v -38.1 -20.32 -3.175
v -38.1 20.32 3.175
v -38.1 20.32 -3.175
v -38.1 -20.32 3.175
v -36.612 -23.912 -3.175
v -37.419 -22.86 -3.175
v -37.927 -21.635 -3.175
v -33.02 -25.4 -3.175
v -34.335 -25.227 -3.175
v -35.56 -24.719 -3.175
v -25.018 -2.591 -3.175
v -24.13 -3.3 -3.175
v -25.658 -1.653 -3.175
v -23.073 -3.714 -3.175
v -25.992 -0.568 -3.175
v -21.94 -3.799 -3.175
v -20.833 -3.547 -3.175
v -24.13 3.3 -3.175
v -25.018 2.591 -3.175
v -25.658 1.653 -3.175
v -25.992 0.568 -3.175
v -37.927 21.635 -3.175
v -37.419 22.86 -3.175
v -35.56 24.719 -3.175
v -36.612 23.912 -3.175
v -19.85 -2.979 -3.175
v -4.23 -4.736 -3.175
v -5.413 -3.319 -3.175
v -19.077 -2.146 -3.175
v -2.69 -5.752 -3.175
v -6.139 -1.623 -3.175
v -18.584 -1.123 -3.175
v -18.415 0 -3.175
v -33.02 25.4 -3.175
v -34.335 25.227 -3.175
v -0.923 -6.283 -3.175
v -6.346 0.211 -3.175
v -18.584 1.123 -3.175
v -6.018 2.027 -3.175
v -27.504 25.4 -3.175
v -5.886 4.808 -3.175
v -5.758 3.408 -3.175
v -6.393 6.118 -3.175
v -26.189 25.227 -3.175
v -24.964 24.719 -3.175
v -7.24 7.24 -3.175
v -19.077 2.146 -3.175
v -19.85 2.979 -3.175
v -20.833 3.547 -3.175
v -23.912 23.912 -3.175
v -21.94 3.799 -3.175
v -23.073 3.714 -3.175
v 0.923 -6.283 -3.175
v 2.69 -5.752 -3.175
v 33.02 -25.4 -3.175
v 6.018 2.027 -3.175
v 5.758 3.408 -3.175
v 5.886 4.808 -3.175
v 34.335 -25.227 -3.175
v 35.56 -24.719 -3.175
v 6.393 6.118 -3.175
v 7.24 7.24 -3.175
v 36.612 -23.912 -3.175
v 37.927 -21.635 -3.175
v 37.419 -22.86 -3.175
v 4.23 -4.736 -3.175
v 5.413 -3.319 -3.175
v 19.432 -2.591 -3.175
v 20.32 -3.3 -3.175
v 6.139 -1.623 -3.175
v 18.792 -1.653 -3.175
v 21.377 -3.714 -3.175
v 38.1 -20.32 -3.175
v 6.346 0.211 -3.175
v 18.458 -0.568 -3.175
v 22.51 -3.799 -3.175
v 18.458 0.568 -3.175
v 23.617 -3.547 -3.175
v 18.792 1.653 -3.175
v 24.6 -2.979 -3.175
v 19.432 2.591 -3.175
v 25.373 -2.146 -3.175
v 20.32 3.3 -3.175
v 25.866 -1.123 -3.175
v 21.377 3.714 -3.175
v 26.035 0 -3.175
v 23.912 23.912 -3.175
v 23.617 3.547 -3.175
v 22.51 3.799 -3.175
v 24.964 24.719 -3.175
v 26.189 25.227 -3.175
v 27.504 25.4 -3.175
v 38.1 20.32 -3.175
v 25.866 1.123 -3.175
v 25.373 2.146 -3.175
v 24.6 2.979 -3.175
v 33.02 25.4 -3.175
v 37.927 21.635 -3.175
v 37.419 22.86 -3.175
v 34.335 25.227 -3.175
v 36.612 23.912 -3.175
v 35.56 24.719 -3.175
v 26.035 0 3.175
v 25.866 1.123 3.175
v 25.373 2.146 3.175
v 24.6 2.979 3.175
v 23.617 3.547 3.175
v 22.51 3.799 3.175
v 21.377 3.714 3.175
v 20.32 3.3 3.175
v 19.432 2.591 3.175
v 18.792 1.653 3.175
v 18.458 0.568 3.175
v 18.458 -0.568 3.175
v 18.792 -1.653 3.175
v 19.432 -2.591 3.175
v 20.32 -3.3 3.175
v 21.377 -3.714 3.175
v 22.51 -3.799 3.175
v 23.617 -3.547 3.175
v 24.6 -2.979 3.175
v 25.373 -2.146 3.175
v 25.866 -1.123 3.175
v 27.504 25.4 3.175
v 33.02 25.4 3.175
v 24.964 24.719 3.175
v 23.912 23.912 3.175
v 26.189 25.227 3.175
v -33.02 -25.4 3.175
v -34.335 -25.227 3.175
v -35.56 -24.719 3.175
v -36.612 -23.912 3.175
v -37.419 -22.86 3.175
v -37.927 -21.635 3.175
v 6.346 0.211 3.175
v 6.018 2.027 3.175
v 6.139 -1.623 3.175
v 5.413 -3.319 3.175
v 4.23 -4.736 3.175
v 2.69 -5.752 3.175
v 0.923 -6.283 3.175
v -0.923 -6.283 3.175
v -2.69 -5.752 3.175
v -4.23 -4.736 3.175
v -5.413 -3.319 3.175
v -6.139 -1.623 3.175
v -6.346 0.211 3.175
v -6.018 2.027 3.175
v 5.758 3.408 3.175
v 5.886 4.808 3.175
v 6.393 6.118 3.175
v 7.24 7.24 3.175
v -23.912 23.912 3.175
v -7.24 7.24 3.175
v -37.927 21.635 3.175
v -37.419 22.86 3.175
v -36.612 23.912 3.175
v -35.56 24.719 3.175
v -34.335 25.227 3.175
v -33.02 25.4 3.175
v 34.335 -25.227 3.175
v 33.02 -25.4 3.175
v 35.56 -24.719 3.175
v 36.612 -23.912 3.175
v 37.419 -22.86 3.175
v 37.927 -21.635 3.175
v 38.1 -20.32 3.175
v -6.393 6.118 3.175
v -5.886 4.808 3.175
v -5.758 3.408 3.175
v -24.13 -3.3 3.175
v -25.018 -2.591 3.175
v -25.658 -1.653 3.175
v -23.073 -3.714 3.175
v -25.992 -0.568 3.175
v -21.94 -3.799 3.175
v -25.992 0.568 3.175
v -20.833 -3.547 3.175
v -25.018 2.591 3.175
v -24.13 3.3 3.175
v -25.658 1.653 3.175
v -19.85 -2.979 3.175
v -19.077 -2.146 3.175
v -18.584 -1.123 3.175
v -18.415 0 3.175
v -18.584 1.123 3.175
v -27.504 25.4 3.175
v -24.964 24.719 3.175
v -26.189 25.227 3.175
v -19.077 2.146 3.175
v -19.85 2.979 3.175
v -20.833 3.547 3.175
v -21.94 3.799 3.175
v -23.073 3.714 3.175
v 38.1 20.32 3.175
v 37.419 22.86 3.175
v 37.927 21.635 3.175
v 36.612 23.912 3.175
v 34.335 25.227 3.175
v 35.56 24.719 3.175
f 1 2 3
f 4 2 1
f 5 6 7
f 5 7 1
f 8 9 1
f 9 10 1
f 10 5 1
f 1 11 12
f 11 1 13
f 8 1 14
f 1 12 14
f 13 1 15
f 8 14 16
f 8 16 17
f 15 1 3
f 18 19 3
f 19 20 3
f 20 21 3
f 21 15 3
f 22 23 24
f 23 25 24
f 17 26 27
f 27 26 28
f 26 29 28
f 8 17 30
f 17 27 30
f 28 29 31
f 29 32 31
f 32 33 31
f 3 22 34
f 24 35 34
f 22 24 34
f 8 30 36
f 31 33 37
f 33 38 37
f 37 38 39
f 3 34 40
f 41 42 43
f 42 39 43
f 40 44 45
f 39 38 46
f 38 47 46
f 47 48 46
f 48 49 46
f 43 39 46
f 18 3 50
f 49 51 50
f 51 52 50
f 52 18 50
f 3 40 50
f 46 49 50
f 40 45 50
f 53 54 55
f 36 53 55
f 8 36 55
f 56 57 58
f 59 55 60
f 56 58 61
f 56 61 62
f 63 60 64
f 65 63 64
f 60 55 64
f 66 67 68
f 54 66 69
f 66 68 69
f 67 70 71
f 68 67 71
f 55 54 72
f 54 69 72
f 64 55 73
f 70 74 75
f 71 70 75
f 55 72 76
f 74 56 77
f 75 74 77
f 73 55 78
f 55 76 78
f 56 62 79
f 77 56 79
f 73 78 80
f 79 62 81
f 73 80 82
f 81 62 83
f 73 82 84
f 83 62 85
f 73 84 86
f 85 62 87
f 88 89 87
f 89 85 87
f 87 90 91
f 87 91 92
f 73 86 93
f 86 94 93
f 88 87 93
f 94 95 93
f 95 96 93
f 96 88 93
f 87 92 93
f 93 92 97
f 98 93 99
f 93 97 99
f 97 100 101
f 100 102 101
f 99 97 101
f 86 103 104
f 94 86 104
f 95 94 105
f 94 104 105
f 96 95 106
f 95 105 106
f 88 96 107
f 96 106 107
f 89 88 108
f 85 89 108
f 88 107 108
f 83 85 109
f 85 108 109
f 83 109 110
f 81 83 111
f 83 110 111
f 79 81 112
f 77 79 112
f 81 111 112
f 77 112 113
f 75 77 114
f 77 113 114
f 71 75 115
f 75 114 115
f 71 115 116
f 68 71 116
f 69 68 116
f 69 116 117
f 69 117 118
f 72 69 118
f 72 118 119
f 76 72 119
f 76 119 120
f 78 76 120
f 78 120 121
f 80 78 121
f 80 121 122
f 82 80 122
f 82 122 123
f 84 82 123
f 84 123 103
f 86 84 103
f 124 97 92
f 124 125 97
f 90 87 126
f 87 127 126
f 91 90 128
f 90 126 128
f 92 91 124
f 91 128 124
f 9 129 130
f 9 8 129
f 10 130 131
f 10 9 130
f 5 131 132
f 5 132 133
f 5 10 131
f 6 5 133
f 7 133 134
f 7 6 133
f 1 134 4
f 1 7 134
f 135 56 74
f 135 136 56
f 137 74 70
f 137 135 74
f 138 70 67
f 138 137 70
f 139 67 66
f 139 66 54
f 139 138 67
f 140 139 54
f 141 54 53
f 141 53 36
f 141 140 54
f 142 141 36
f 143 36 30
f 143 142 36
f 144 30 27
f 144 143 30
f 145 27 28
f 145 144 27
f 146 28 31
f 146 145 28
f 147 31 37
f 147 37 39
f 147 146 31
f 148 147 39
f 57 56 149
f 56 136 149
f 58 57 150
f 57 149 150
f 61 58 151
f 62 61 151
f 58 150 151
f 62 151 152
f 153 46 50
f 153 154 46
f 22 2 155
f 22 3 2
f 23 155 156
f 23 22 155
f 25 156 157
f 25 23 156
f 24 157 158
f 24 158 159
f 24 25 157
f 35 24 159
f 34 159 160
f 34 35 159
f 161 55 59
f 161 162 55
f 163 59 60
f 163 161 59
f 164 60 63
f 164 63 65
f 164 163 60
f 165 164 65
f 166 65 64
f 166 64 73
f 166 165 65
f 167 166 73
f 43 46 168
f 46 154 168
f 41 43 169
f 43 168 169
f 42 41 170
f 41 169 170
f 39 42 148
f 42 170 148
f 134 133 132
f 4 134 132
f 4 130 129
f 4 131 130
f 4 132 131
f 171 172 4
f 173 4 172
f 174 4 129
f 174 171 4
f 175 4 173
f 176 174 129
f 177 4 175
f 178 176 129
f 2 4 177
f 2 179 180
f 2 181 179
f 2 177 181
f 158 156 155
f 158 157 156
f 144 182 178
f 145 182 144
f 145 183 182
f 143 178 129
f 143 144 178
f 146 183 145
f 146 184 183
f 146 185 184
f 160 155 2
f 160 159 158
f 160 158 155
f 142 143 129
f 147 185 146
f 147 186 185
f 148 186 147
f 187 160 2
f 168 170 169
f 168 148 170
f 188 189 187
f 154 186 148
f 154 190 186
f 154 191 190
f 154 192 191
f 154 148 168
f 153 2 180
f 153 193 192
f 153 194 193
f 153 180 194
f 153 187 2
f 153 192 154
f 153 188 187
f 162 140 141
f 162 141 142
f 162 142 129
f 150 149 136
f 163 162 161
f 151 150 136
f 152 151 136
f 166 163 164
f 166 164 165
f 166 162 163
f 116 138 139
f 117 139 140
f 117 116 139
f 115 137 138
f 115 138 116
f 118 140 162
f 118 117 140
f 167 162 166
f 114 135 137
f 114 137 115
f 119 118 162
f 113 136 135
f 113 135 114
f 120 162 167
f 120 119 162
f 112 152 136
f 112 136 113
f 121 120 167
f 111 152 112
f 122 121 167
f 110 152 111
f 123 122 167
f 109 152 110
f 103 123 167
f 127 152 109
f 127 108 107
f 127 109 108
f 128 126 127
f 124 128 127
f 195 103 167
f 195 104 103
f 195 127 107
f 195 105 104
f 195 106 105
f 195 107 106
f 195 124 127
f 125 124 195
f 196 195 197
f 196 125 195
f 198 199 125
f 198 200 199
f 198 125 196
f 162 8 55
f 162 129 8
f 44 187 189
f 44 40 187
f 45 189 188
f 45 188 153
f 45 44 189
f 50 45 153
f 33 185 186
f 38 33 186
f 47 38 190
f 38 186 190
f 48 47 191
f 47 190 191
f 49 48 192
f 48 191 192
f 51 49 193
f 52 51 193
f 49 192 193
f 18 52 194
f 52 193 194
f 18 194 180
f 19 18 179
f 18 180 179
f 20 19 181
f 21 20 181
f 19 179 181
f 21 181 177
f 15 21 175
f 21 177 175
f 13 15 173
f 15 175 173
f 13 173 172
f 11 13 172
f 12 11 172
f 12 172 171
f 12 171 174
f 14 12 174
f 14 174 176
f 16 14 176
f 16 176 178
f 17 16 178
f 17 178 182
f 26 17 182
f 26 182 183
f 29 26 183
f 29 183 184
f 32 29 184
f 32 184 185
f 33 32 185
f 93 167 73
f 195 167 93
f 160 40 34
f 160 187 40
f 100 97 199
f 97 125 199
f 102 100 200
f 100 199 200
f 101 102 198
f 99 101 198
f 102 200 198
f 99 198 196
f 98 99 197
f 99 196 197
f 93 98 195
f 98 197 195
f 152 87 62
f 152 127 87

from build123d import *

# Parameters (mm, degrees)
F1_DEPTH = 3.175
F2_R     = 5.08
F3_R     = 3.81
F4_DEPTH = 25.4


with BuildPart() as f1:
    # F0 (on Top) → F1 (new body, symmetric)
    with BuildSketch(Plane.XY):
        with BuildLine():
            Line((-38.1, -25.4), (38.1, -25.4))
            Line((38.1, -25.4), (38.1, 25.4))
            Line((38.1, 25.4), (25.4, 25.4))
            Line((25.4, 25.4), (4.4901280605, 4.4901280605))
            ThreePointArc((4.4901280605, 4.4901280605), (0, -6.35), (-4.4901280605, 4.4901280605))
            Line((-4.4901280605, 4.4901280605), (-25.4, 25.4))
            Line((-25.4, 25.4), (-38.1, 25.4))
            Line((-38.1, 25.4), (-38.1, -25.4))
        make_face()
    extrude(amount=F1_DEPTH, both=True)

    # F2
    f2_edges = [f1.edges().sort_by_distance(p)[0] for p in [
        (4.490128, 4.490128, 0),
        (-4.490128, 4.490128, 0),
        (-25.4, 25.4, 0),
        (-38.1, 25.4, 0),
        (-38.1, -25.4, 0),
        (38.1, 25.4, 0),
        (25.4, 25.4, 0),
        (38.1, -25.4, 0),
    ]]
    fillet(f2_edges, radius=F2_R)

    # F3 (on face) → F4 (cut)
    with BuildSketch(Plane.XY.offset(3.175)):
        with BuildLine():
            ThreePointArc((-26.035, 0), (-22.225, -3.81), (-18.415, 0))
            ThreePointArc((-18.415, 0), (-22.225, 3.81), (-26.035, 0))
        make_face()
        with Locations((22.225, 0)):
            Circle(F3_R)
    extrude(amount=-F4_DEPTH, mode=Mode.SUBTRACT)


solid = f1.part
